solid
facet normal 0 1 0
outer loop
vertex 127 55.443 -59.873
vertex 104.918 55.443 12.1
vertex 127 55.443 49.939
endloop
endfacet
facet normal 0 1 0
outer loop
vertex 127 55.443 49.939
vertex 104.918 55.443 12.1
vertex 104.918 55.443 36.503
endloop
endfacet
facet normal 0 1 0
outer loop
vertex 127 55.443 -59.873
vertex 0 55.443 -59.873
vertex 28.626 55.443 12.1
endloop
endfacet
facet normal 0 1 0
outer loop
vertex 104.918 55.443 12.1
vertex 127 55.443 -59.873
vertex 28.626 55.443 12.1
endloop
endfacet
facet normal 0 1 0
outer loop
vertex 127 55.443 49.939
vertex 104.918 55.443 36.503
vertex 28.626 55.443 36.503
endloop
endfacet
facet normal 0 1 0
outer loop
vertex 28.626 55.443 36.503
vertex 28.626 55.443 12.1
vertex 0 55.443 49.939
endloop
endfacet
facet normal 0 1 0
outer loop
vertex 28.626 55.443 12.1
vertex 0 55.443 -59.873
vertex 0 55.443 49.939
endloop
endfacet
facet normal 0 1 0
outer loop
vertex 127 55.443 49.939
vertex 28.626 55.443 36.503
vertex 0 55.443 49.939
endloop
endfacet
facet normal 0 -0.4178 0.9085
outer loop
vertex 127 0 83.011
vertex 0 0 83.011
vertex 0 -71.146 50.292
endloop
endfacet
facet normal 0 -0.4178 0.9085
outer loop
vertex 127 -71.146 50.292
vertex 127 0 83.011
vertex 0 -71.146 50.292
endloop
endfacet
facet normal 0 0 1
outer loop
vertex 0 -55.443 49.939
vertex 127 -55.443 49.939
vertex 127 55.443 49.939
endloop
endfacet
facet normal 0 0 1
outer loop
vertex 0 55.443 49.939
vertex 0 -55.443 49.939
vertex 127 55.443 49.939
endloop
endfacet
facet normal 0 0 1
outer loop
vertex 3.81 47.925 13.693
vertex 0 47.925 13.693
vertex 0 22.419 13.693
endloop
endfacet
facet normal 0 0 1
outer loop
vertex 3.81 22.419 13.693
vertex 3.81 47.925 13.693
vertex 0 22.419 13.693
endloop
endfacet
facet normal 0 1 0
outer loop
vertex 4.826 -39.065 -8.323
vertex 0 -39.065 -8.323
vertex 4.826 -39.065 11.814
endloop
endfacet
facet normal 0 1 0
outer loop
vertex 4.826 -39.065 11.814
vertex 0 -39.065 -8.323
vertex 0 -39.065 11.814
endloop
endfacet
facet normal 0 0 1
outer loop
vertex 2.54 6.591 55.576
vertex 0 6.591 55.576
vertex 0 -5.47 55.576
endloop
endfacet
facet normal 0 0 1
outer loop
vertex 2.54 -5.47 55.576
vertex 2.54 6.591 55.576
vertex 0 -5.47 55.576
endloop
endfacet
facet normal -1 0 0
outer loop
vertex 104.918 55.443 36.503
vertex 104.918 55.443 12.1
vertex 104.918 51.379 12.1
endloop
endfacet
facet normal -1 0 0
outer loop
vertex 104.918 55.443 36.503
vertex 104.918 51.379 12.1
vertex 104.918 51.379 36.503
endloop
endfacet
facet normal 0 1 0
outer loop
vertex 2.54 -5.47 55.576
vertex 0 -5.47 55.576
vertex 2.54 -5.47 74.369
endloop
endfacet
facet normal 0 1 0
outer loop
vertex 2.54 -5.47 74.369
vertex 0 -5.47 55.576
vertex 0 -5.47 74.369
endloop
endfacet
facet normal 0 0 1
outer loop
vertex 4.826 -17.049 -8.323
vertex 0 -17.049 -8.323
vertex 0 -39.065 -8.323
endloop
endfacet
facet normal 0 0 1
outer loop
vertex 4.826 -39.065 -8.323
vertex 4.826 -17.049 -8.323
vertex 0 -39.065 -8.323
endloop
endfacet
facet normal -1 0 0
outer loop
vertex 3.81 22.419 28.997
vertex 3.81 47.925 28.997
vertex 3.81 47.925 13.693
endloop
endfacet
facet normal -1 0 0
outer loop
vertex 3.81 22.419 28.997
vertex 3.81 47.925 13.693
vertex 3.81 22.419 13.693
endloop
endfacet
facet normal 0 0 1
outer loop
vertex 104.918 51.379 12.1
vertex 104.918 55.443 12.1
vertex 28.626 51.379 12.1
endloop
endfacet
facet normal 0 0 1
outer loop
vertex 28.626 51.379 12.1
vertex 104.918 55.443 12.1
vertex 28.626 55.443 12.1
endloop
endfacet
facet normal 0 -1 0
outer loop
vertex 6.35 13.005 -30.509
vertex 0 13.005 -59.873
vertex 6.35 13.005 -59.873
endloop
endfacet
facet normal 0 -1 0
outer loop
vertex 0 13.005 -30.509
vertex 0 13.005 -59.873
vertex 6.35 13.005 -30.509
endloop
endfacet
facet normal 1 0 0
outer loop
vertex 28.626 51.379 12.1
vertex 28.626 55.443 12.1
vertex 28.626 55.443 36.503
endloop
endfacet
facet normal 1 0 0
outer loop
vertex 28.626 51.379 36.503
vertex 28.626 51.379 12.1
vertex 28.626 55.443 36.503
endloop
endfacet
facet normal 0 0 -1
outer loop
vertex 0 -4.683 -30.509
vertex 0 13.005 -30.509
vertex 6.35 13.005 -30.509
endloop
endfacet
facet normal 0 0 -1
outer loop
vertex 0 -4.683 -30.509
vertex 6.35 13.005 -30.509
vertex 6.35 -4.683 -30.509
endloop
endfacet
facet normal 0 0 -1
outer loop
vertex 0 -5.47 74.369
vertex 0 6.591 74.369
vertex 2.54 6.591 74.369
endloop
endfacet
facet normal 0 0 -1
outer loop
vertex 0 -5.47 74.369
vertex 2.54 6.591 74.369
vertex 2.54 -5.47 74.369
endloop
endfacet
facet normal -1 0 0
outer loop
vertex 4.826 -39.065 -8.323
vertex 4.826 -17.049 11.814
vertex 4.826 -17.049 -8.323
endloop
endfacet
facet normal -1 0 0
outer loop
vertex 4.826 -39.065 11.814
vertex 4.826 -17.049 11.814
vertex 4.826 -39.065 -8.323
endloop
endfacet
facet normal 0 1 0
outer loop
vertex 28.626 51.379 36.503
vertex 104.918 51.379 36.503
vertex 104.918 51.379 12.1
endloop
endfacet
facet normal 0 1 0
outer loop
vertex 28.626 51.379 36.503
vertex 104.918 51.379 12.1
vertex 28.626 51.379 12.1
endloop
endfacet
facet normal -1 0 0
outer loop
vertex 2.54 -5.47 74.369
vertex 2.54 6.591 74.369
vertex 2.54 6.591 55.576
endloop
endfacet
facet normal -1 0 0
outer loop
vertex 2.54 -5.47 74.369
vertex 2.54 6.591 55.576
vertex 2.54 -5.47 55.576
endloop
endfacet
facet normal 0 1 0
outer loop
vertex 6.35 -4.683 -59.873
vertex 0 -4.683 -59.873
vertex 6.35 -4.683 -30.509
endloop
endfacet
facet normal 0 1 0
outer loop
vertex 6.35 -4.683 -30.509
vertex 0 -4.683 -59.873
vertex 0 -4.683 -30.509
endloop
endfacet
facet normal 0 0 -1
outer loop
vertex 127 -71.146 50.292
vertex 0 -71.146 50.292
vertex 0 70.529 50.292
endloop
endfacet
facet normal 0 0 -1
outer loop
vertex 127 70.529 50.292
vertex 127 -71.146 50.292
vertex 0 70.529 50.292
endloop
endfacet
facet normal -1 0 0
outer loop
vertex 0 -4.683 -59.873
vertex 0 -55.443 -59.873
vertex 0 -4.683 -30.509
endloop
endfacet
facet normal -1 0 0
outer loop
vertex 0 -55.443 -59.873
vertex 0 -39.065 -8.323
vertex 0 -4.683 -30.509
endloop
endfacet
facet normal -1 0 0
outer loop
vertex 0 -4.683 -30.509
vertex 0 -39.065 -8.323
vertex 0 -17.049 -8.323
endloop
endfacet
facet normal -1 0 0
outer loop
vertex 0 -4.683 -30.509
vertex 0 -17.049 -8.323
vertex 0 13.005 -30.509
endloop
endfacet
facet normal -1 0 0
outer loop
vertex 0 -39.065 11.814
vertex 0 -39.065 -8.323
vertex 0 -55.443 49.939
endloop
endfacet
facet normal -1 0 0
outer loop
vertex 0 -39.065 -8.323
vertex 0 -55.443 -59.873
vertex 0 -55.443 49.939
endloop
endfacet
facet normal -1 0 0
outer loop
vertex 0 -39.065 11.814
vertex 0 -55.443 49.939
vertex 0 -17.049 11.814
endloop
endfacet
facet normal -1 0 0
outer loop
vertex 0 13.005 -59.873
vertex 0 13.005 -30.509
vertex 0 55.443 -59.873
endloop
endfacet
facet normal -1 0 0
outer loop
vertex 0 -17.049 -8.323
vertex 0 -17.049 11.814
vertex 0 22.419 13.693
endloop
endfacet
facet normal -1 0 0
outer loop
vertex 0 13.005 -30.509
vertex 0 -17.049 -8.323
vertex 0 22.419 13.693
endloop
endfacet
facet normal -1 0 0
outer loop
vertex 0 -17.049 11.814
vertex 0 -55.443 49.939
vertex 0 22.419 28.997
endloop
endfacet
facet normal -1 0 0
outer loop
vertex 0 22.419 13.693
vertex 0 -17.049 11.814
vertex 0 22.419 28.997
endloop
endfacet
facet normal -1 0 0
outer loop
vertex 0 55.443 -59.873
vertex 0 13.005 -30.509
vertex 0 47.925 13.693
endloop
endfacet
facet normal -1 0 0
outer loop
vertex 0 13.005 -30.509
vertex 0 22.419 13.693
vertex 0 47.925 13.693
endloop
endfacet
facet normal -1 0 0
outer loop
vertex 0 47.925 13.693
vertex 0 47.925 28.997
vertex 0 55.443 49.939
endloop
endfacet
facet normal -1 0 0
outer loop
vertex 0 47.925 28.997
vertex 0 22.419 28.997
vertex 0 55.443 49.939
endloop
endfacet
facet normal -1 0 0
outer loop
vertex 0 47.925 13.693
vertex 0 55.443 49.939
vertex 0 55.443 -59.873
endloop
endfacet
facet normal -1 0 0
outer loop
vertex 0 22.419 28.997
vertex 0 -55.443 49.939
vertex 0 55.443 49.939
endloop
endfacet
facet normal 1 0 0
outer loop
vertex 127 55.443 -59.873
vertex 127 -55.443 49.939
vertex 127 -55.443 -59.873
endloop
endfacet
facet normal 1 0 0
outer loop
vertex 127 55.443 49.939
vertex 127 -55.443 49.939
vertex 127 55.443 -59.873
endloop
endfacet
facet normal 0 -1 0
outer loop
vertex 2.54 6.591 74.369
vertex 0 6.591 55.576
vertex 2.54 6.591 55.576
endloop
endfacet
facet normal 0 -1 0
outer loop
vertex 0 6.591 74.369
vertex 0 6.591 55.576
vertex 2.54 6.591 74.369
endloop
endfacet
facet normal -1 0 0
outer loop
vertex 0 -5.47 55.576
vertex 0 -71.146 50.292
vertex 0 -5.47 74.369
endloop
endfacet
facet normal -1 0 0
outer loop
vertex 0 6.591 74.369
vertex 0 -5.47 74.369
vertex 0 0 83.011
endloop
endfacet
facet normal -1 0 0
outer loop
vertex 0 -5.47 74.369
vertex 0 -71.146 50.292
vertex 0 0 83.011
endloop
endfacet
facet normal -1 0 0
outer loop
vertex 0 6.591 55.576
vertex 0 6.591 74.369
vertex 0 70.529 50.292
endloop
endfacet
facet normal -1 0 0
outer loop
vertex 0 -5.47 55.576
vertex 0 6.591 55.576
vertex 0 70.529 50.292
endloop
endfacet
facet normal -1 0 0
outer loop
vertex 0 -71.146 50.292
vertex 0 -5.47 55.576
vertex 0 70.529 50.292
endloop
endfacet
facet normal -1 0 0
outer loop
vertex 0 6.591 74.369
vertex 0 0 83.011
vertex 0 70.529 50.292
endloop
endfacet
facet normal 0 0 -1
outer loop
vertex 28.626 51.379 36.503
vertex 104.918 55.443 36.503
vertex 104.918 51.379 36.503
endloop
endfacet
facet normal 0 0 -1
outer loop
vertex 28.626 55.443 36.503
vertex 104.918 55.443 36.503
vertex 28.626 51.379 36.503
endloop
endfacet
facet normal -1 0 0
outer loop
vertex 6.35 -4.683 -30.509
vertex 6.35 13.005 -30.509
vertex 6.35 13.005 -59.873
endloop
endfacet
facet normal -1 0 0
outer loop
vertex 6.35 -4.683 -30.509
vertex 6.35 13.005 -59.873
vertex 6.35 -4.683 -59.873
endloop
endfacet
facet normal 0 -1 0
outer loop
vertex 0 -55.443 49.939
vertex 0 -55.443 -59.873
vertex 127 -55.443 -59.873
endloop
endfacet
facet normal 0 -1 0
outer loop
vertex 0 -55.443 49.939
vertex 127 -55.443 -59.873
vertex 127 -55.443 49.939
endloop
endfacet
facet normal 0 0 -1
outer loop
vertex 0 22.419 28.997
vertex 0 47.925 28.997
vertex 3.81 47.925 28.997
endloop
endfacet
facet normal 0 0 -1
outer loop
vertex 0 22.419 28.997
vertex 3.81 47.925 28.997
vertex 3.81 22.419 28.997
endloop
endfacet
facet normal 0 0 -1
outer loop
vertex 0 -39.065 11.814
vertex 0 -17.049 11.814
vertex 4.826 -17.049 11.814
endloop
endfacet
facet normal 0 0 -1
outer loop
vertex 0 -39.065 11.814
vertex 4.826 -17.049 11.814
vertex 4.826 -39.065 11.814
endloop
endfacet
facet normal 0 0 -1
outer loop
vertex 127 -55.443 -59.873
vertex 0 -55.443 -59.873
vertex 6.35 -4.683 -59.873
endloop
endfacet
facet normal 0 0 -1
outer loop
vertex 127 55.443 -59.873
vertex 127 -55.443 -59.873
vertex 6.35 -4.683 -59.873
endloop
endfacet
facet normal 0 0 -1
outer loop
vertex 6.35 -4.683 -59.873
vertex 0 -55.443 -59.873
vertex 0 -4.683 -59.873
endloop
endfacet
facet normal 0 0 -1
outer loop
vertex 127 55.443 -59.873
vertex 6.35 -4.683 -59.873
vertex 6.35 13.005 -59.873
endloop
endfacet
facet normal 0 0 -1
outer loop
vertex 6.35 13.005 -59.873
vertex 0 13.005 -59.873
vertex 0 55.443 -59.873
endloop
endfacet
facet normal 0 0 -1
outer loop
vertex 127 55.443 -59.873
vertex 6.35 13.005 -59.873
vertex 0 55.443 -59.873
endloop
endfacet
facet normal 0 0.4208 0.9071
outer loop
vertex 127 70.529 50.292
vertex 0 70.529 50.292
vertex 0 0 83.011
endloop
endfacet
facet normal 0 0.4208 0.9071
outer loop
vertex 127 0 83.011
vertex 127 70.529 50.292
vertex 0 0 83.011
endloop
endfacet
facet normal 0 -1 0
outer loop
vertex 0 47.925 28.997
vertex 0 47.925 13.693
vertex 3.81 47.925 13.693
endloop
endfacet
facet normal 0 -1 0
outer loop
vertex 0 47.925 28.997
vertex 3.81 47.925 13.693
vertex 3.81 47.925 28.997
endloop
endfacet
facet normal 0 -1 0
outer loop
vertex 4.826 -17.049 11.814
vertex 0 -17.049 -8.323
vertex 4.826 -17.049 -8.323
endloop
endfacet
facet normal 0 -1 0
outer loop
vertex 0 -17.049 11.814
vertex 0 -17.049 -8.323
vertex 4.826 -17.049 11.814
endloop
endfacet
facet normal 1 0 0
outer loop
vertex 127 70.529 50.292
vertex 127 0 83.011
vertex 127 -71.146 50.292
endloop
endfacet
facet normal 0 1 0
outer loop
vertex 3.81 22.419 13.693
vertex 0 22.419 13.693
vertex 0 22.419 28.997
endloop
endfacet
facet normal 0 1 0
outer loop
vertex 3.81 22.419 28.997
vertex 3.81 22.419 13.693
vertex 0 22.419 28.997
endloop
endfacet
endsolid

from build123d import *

# Parameters (mm, degrees)
F0_W      = 110.8863390982
F0_H      = 109.8123788834
F1_DEPTH  = 127
F2_W      = 17.6881682128
F2_H      = 29.3643288314
F3_DEPTH  = 6.35
F4_W      = 25.5065448582
F4_H      = 15.3039274737
F5_DEPTH  = 3.81
F6_W      = 22.0161788166
F6_H      = 20.1367447153
F7_DEPTH  = 4.826
F9_DEPTH  = 127
F10_W     = 76.2928482145
F10_H     = 24.4024917483
F11_DEPTH = 4.064
F12_W     = 12.0610017329
F12_H     = 18.7927260995
F13_DEPTH = 2.54


with BuildPart() as f1:
    # F0 (on Right) → F1 (new body)
    with BuildSketch(Plane.YZ):
        with Locations((-1.8626e-06, -4.9670636654)):
            Rectangle(F0_W, F0_H)
    extrude(amount=F1_DEPTH)

    # F2 (on face) → F3 (cut)
    with BuildSketch(Plane(origin=(0, 0, 0), x_dir=(0, -1, 0), z_dir=(-1, 0, 0))):
        with Locations((-4.1606072336, -45.1910886914)):
            Rectangle(F2_W, F2_H)
    extrude(amount=-F3_DEPTH, mode=Mode.SUBTRACT)

    # F4 (on face) → F5 (cut)
    with BuildSketch(Plane(origin=(0, 0, 0), x_dir=(0, -1, 0), z_dir=(-1, 0, 0))):
        with Locations((-35.172181204, 21.3449508883)):
            Rectangle(F4_W, F4_H)
    extrude(amount=-F5_DEPTH, mode=Mode.SUBTRACT)

    # F6 (on face) → F7 (cut)
    with BuildSketch(Plane(origin=(0, 0, 0), x_dir=(0, -1, 0), z_dir=(-1, 0, 0))):
        with Locations((28.0571971089, 1.7451844178)):
            Rectangle(F6_W, F6_H)
    extrude(amount=-F7_DEPTH, mode=Mode.SUBTRACT)

    # F10 (on face) → F11 (cut)
    with BuildSketch(Plane(origin=(0, 55.4431676865, 0), x_dir=(-1, 0, 0), z_dir=(0, 1, 0))):
        with Locations((-66.772040911, 24.3016667664)):
            Rectangle(F10_W, F10_H)
    extrude(amount=-F11_DEPTH, mode=Mode.SUBTRACT)


with BuildPart() as f9:
    # F8 (on Right) → F9 (new body)
    with BuildSketch(Plane.YZ):
        Polygon((-71.1464881897, 50.2924360335), (70.5291628838, 50.2924360335), (0, 83.0105617642), align=None)
    extrude(amount=F9_DEPTH)

    # F12 (on face) → F13 (cut)
    with BuildSketch(Plane(origin=(0, 0, 0), x_dir=(0, -1, 0), z_dir=(-1, 0, 0))):
        with Locations((-0.5609779619, 64.972486347)):
            Rectangle(F12_W, F12_H)
    extrude(amount=-F13_DEPTH, mode=Mode.SUBTRACT)


solid = Compound([f1.part, f9.part])
